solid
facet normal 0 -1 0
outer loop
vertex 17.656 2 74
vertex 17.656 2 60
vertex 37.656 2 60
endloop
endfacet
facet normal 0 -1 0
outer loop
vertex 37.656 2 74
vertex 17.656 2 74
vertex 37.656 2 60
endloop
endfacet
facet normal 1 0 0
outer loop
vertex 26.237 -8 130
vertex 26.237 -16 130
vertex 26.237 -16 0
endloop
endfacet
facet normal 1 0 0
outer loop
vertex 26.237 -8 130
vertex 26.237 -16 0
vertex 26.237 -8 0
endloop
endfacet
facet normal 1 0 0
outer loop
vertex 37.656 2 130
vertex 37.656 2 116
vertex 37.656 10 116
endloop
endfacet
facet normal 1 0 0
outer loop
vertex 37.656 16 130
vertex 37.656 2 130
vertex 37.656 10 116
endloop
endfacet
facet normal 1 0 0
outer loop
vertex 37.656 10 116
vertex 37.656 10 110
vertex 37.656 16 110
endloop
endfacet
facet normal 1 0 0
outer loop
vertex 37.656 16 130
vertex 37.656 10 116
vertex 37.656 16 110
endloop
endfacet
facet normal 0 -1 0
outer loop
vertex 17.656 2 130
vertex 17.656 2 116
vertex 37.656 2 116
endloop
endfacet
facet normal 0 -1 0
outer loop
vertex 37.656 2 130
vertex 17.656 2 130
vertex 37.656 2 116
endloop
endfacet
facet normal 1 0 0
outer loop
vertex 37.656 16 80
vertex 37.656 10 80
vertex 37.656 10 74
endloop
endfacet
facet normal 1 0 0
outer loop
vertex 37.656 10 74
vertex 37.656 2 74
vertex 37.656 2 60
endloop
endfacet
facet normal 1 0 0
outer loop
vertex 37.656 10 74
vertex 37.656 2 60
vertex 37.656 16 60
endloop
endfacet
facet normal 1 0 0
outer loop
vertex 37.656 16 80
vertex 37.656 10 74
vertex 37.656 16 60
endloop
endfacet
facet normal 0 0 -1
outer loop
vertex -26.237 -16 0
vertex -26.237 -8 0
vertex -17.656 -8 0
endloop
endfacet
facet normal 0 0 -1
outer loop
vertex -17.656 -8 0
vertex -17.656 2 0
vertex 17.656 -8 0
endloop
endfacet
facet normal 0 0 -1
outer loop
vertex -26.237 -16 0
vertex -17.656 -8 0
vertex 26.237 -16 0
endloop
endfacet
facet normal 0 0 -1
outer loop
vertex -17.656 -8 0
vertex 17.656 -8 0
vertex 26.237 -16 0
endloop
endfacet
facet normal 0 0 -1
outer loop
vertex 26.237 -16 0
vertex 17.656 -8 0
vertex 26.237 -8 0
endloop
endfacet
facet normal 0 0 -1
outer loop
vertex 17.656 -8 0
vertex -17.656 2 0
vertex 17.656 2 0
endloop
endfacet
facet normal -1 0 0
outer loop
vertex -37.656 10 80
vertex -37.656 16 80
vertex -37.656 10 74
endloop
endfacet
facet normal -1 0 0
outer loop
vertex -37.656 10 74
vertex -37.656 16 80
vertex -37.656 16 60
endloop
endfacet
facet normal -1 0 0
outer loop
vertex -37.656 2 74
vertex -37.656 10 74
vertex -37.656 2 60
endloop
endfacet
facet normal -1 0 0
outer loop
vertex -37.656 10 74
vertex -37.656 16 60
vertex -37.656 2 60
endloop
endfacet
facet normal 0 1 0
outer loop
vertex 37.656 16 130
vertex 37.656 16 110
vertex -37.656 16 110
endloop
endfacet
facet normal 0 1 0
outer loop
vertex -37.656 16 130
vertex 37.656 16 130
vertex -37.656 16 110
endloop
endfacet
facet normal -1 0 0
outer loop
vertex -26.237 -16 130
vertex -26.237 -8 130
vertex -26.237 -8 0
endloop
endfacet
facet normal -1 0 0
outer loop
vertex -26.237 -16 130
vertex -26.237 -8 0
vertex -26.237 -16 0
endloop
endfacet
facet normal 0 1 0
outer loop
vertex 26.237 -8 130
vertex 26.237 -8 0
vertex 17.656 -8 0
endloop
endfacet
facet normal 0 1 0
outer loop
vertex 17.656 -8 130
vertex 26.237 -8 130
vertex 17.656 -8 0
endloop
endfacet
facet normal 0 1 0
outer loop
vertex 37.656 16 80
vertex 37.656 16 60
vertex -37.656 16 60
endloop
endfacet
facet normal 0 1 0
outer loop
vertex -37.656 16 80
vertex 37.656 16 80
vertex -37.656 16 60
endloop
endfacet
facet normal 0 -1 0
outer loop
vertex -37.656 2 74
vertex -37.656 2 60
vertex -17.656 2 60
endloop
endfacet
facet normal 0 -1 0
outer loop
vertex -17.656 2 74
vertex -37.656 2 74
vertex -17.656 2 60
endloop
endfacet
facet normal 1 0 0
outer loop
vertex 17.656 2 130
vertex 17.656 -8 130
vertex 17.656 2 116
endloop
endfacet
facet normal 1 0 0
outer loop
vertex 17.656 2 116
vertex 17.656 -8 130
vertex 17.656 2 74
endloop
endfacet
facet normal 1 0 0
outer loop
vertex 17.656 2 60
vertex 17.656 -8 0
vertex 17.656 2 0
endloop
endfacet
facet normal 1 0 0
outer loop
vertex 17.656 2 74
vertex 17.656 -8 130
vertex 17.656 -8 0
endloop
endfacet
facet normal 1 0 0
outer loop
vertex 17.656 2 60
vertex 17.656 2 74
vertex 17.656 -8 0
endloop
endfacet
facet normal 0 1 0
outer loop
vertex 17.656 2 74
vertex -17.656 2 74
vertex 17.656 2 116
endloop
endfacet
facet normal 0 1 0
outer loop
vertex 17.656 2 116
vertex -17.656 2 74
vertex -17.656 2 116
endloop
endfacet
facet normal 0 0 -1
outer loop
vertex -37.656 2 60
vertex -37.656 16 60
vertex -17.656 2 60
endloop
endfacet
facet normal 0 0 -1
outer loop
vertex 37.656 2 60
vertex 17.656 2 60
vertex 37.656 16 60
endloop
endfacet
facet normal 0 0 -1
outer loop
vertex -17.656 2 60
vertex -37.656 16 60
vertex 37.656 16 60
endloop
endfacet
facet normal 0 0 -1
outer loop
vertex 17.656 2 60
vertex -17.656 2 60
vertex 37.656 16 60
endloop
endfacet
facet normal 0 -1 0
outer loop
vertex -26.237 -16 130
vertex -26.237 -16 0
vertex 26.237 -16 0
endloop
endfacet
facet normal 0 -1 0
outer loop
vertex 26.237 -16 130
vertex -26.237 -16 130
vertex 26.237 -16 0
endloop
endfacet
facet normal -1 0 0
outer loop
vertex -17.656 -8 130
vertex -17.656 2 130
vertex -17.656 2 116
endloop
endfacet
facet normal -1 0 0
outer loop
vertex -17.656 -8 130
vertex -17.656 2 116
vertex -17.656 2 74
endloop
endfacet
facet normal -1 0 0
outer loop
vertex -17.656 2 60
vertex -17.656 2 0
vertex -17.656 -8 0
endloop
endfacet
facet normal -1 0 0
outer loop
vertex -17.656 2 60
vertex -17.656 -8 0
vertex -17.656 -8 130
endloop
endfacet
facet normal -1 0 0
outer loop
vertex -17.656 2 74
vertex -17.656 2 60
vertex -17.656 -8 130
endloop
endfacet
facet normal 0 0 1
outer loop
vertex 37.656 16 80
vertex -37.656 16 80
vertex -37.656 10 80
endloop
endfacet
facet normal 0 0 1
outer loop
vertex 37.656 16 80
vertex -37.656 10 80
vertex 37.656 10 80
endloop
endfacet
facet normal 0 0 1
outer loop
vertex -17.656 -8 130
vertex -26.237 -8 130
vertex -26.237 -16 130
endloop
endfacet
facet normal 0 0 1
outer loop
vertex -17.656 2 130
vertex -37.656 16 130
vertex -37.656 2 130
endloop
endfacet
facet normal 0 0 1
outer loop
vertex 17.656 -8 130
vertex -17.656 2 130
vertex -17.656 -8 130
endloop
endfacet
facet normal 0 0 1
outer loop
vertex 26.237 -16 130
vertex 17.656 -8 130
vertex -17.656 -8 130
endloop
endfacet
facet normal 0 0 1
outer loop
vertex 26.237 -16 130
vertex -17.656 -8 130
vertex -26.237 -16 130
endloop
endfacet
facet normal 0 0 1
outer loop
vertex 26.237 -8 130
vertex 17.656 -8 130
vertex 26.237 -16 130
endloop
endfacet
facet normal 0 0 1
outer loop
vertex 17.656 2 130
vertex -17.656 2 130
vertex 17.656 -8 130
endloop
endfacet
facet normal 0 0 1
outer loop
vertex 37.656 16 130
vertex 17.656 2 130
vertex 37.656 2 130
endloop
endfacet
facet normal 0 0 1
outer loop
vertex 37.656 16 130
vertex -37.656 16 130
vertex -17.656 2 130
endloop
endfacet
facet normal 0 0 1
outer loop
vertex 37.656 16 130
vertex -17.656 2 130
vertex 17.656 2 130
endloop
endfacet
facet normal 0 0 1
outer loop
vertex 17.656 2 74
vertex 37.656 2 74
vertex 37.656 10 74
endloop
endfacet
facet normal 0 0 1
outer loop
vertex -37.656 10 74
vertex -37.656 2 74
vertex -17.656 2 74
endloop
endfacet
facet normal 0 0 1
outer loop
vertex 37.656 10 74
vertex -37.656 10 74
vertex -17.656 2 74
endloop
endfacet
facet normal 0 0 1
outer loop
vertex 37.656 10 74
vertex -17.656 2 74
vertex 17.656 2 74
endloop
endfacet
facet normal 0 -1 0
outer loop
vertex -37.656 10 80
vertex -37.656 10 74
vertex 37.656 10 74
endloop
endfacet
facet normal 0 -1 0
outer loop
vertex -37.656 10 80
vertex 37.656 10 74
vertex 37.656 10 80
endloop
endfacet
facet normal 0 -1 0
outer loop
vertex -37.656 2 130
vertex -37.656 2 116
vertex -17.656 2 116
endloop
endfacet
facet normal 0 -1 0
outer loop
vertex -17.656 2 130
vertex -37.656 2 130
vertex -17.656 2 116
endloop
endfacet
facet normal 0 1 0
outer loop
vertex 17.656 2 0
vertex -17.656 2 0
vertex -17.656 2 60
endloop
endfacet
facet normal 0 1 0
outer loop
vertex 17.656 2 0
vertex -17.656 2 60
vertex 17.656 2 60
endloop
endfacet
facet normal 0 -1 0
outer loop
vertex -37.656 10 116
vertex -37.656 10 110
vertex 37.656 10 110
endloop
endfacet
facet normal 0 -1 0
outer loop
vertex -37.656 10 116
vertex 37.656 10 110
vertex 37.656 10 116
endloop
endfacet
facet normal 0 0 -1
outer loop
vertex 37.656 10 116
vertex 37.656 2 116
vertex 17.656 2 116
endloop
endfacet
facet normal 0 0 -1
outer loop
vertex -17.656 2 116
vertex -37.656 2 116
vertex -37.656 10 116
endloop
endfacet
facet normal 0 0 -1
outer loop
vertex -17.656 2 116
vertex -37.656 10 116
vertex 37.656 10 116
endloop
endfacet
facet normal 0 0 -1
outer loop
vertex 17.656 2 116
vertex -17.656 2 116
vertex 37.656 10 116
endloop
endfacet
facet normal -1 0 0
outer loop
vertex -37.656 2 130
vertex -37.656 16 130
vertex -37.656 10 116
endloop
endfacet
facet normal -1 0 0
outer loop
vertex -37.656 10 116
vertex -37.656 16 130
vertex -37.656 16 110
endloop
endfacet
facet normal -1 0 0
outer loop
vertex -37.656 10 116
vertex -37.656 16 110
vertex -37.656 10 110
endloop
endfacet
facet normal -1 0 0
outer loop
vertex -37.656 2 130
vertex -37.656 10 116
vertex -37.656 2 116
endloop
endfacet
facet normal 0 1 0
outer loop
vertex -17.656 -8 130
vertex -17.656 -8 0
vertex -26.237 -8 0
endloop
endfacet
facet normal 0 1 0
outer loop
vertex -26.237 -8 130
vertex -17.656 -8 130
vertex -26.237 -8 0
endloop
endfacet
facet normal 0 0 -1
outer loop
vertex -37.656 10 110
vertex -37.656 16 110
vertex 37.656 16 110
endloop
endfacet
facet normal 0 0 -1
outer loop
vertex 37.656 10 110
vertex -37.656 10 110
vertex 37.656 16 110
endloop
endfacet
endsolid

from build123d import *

# Parameters (mm, degrees)
BOSS_EXTRUDE1_DEPTH = 130
SKETCH3_W           = 75.312470342
SKETCH3_H           = 30
CUT_EXTRUDE1_DEPTH  = 14
SKETCH4_W           = 75.312470342
SKETCH4_H           = 60
CUT_EXTRUDE2_DEPTH  = 14
SKETCH5_W           = 6
SKETCH5_H           = 8
CUT_EXTRUDE3_DEPTH  = 94
SKETCH6_W           = 6
SKETCH6_H           = 8
CUT_EXTRUDE4_DEPTH  = 94


with BuildPart() as part:
    # Sketch1 → Boss-Extrude1 (new body)
    with BuildSketch(Plane.XY):
        Polygon((37.656235171, 2), (37.656235171, 16), (-37.656235171, 16), (-37.656235171, 2), (-17.656235171, 2), (-17.656235171, -8), (-26.236747462, -8), (-26.236747462, -16), (0, -16), (26.236747462, -16), (26.236747462, -8), (17.656235171, -8), (17.656235171, 2), align=None)
    extrude(amount=BOSS_EXTRUDE1_DEPTH)

    # Sketch3 → Cut-Extrude1 (cut)
    with BuildSketch(Plane(origin=(0, 16, 0), x_dir=(1, 0, 0), z_dir=(0, 1, 0))):
        with Locations((0, -95)):
            Rectangle(SKETCH3_W, SKETCH3_H)
    extrude(amount=-CUT_EXTRUDE1_DEPTH, mode=Mode.SUBTRACT)

    # Sketch4 → Cut-Extrude2 (cut)
    with BuildSketch(Plane(origin=(0, 16, 0), x_dir=(1, 0, 0), z_dir=(0, 1, 0))):
        with Locations((0, -30)):
            Rectangle(SKETCH4_W, SKETCH4_H)
    extrude(amount=-CUT_EXTRUDE2_DEPTH, mode=Mode.SUBTRACT)

    # Sketch5 → Cut-Extrude3 (cut)
    with BuildSketch(Plane.ZY.offset(37.656235171)):
        with Locations((77, 6)):
            Rectangle(SKETCH5_W, SKETCH5_H)
    extrude(amount=-CUT_EXTRUDE3_DEPTH, mode=Mode.SUBTRACT)

    # Sketch6 → Cut-Extrude4 (cut)
    with BuildSketch(Plane.ZY.offset(37.656235171)):
        with Locations((113, 6)):
            Rectangle(SKETCH6_W, SKETCH6_H)
    extrude(amount=-CUT_EXTRUDE4_DEPTH, mode=Mode.SUBTRACT)


solid = part.part
